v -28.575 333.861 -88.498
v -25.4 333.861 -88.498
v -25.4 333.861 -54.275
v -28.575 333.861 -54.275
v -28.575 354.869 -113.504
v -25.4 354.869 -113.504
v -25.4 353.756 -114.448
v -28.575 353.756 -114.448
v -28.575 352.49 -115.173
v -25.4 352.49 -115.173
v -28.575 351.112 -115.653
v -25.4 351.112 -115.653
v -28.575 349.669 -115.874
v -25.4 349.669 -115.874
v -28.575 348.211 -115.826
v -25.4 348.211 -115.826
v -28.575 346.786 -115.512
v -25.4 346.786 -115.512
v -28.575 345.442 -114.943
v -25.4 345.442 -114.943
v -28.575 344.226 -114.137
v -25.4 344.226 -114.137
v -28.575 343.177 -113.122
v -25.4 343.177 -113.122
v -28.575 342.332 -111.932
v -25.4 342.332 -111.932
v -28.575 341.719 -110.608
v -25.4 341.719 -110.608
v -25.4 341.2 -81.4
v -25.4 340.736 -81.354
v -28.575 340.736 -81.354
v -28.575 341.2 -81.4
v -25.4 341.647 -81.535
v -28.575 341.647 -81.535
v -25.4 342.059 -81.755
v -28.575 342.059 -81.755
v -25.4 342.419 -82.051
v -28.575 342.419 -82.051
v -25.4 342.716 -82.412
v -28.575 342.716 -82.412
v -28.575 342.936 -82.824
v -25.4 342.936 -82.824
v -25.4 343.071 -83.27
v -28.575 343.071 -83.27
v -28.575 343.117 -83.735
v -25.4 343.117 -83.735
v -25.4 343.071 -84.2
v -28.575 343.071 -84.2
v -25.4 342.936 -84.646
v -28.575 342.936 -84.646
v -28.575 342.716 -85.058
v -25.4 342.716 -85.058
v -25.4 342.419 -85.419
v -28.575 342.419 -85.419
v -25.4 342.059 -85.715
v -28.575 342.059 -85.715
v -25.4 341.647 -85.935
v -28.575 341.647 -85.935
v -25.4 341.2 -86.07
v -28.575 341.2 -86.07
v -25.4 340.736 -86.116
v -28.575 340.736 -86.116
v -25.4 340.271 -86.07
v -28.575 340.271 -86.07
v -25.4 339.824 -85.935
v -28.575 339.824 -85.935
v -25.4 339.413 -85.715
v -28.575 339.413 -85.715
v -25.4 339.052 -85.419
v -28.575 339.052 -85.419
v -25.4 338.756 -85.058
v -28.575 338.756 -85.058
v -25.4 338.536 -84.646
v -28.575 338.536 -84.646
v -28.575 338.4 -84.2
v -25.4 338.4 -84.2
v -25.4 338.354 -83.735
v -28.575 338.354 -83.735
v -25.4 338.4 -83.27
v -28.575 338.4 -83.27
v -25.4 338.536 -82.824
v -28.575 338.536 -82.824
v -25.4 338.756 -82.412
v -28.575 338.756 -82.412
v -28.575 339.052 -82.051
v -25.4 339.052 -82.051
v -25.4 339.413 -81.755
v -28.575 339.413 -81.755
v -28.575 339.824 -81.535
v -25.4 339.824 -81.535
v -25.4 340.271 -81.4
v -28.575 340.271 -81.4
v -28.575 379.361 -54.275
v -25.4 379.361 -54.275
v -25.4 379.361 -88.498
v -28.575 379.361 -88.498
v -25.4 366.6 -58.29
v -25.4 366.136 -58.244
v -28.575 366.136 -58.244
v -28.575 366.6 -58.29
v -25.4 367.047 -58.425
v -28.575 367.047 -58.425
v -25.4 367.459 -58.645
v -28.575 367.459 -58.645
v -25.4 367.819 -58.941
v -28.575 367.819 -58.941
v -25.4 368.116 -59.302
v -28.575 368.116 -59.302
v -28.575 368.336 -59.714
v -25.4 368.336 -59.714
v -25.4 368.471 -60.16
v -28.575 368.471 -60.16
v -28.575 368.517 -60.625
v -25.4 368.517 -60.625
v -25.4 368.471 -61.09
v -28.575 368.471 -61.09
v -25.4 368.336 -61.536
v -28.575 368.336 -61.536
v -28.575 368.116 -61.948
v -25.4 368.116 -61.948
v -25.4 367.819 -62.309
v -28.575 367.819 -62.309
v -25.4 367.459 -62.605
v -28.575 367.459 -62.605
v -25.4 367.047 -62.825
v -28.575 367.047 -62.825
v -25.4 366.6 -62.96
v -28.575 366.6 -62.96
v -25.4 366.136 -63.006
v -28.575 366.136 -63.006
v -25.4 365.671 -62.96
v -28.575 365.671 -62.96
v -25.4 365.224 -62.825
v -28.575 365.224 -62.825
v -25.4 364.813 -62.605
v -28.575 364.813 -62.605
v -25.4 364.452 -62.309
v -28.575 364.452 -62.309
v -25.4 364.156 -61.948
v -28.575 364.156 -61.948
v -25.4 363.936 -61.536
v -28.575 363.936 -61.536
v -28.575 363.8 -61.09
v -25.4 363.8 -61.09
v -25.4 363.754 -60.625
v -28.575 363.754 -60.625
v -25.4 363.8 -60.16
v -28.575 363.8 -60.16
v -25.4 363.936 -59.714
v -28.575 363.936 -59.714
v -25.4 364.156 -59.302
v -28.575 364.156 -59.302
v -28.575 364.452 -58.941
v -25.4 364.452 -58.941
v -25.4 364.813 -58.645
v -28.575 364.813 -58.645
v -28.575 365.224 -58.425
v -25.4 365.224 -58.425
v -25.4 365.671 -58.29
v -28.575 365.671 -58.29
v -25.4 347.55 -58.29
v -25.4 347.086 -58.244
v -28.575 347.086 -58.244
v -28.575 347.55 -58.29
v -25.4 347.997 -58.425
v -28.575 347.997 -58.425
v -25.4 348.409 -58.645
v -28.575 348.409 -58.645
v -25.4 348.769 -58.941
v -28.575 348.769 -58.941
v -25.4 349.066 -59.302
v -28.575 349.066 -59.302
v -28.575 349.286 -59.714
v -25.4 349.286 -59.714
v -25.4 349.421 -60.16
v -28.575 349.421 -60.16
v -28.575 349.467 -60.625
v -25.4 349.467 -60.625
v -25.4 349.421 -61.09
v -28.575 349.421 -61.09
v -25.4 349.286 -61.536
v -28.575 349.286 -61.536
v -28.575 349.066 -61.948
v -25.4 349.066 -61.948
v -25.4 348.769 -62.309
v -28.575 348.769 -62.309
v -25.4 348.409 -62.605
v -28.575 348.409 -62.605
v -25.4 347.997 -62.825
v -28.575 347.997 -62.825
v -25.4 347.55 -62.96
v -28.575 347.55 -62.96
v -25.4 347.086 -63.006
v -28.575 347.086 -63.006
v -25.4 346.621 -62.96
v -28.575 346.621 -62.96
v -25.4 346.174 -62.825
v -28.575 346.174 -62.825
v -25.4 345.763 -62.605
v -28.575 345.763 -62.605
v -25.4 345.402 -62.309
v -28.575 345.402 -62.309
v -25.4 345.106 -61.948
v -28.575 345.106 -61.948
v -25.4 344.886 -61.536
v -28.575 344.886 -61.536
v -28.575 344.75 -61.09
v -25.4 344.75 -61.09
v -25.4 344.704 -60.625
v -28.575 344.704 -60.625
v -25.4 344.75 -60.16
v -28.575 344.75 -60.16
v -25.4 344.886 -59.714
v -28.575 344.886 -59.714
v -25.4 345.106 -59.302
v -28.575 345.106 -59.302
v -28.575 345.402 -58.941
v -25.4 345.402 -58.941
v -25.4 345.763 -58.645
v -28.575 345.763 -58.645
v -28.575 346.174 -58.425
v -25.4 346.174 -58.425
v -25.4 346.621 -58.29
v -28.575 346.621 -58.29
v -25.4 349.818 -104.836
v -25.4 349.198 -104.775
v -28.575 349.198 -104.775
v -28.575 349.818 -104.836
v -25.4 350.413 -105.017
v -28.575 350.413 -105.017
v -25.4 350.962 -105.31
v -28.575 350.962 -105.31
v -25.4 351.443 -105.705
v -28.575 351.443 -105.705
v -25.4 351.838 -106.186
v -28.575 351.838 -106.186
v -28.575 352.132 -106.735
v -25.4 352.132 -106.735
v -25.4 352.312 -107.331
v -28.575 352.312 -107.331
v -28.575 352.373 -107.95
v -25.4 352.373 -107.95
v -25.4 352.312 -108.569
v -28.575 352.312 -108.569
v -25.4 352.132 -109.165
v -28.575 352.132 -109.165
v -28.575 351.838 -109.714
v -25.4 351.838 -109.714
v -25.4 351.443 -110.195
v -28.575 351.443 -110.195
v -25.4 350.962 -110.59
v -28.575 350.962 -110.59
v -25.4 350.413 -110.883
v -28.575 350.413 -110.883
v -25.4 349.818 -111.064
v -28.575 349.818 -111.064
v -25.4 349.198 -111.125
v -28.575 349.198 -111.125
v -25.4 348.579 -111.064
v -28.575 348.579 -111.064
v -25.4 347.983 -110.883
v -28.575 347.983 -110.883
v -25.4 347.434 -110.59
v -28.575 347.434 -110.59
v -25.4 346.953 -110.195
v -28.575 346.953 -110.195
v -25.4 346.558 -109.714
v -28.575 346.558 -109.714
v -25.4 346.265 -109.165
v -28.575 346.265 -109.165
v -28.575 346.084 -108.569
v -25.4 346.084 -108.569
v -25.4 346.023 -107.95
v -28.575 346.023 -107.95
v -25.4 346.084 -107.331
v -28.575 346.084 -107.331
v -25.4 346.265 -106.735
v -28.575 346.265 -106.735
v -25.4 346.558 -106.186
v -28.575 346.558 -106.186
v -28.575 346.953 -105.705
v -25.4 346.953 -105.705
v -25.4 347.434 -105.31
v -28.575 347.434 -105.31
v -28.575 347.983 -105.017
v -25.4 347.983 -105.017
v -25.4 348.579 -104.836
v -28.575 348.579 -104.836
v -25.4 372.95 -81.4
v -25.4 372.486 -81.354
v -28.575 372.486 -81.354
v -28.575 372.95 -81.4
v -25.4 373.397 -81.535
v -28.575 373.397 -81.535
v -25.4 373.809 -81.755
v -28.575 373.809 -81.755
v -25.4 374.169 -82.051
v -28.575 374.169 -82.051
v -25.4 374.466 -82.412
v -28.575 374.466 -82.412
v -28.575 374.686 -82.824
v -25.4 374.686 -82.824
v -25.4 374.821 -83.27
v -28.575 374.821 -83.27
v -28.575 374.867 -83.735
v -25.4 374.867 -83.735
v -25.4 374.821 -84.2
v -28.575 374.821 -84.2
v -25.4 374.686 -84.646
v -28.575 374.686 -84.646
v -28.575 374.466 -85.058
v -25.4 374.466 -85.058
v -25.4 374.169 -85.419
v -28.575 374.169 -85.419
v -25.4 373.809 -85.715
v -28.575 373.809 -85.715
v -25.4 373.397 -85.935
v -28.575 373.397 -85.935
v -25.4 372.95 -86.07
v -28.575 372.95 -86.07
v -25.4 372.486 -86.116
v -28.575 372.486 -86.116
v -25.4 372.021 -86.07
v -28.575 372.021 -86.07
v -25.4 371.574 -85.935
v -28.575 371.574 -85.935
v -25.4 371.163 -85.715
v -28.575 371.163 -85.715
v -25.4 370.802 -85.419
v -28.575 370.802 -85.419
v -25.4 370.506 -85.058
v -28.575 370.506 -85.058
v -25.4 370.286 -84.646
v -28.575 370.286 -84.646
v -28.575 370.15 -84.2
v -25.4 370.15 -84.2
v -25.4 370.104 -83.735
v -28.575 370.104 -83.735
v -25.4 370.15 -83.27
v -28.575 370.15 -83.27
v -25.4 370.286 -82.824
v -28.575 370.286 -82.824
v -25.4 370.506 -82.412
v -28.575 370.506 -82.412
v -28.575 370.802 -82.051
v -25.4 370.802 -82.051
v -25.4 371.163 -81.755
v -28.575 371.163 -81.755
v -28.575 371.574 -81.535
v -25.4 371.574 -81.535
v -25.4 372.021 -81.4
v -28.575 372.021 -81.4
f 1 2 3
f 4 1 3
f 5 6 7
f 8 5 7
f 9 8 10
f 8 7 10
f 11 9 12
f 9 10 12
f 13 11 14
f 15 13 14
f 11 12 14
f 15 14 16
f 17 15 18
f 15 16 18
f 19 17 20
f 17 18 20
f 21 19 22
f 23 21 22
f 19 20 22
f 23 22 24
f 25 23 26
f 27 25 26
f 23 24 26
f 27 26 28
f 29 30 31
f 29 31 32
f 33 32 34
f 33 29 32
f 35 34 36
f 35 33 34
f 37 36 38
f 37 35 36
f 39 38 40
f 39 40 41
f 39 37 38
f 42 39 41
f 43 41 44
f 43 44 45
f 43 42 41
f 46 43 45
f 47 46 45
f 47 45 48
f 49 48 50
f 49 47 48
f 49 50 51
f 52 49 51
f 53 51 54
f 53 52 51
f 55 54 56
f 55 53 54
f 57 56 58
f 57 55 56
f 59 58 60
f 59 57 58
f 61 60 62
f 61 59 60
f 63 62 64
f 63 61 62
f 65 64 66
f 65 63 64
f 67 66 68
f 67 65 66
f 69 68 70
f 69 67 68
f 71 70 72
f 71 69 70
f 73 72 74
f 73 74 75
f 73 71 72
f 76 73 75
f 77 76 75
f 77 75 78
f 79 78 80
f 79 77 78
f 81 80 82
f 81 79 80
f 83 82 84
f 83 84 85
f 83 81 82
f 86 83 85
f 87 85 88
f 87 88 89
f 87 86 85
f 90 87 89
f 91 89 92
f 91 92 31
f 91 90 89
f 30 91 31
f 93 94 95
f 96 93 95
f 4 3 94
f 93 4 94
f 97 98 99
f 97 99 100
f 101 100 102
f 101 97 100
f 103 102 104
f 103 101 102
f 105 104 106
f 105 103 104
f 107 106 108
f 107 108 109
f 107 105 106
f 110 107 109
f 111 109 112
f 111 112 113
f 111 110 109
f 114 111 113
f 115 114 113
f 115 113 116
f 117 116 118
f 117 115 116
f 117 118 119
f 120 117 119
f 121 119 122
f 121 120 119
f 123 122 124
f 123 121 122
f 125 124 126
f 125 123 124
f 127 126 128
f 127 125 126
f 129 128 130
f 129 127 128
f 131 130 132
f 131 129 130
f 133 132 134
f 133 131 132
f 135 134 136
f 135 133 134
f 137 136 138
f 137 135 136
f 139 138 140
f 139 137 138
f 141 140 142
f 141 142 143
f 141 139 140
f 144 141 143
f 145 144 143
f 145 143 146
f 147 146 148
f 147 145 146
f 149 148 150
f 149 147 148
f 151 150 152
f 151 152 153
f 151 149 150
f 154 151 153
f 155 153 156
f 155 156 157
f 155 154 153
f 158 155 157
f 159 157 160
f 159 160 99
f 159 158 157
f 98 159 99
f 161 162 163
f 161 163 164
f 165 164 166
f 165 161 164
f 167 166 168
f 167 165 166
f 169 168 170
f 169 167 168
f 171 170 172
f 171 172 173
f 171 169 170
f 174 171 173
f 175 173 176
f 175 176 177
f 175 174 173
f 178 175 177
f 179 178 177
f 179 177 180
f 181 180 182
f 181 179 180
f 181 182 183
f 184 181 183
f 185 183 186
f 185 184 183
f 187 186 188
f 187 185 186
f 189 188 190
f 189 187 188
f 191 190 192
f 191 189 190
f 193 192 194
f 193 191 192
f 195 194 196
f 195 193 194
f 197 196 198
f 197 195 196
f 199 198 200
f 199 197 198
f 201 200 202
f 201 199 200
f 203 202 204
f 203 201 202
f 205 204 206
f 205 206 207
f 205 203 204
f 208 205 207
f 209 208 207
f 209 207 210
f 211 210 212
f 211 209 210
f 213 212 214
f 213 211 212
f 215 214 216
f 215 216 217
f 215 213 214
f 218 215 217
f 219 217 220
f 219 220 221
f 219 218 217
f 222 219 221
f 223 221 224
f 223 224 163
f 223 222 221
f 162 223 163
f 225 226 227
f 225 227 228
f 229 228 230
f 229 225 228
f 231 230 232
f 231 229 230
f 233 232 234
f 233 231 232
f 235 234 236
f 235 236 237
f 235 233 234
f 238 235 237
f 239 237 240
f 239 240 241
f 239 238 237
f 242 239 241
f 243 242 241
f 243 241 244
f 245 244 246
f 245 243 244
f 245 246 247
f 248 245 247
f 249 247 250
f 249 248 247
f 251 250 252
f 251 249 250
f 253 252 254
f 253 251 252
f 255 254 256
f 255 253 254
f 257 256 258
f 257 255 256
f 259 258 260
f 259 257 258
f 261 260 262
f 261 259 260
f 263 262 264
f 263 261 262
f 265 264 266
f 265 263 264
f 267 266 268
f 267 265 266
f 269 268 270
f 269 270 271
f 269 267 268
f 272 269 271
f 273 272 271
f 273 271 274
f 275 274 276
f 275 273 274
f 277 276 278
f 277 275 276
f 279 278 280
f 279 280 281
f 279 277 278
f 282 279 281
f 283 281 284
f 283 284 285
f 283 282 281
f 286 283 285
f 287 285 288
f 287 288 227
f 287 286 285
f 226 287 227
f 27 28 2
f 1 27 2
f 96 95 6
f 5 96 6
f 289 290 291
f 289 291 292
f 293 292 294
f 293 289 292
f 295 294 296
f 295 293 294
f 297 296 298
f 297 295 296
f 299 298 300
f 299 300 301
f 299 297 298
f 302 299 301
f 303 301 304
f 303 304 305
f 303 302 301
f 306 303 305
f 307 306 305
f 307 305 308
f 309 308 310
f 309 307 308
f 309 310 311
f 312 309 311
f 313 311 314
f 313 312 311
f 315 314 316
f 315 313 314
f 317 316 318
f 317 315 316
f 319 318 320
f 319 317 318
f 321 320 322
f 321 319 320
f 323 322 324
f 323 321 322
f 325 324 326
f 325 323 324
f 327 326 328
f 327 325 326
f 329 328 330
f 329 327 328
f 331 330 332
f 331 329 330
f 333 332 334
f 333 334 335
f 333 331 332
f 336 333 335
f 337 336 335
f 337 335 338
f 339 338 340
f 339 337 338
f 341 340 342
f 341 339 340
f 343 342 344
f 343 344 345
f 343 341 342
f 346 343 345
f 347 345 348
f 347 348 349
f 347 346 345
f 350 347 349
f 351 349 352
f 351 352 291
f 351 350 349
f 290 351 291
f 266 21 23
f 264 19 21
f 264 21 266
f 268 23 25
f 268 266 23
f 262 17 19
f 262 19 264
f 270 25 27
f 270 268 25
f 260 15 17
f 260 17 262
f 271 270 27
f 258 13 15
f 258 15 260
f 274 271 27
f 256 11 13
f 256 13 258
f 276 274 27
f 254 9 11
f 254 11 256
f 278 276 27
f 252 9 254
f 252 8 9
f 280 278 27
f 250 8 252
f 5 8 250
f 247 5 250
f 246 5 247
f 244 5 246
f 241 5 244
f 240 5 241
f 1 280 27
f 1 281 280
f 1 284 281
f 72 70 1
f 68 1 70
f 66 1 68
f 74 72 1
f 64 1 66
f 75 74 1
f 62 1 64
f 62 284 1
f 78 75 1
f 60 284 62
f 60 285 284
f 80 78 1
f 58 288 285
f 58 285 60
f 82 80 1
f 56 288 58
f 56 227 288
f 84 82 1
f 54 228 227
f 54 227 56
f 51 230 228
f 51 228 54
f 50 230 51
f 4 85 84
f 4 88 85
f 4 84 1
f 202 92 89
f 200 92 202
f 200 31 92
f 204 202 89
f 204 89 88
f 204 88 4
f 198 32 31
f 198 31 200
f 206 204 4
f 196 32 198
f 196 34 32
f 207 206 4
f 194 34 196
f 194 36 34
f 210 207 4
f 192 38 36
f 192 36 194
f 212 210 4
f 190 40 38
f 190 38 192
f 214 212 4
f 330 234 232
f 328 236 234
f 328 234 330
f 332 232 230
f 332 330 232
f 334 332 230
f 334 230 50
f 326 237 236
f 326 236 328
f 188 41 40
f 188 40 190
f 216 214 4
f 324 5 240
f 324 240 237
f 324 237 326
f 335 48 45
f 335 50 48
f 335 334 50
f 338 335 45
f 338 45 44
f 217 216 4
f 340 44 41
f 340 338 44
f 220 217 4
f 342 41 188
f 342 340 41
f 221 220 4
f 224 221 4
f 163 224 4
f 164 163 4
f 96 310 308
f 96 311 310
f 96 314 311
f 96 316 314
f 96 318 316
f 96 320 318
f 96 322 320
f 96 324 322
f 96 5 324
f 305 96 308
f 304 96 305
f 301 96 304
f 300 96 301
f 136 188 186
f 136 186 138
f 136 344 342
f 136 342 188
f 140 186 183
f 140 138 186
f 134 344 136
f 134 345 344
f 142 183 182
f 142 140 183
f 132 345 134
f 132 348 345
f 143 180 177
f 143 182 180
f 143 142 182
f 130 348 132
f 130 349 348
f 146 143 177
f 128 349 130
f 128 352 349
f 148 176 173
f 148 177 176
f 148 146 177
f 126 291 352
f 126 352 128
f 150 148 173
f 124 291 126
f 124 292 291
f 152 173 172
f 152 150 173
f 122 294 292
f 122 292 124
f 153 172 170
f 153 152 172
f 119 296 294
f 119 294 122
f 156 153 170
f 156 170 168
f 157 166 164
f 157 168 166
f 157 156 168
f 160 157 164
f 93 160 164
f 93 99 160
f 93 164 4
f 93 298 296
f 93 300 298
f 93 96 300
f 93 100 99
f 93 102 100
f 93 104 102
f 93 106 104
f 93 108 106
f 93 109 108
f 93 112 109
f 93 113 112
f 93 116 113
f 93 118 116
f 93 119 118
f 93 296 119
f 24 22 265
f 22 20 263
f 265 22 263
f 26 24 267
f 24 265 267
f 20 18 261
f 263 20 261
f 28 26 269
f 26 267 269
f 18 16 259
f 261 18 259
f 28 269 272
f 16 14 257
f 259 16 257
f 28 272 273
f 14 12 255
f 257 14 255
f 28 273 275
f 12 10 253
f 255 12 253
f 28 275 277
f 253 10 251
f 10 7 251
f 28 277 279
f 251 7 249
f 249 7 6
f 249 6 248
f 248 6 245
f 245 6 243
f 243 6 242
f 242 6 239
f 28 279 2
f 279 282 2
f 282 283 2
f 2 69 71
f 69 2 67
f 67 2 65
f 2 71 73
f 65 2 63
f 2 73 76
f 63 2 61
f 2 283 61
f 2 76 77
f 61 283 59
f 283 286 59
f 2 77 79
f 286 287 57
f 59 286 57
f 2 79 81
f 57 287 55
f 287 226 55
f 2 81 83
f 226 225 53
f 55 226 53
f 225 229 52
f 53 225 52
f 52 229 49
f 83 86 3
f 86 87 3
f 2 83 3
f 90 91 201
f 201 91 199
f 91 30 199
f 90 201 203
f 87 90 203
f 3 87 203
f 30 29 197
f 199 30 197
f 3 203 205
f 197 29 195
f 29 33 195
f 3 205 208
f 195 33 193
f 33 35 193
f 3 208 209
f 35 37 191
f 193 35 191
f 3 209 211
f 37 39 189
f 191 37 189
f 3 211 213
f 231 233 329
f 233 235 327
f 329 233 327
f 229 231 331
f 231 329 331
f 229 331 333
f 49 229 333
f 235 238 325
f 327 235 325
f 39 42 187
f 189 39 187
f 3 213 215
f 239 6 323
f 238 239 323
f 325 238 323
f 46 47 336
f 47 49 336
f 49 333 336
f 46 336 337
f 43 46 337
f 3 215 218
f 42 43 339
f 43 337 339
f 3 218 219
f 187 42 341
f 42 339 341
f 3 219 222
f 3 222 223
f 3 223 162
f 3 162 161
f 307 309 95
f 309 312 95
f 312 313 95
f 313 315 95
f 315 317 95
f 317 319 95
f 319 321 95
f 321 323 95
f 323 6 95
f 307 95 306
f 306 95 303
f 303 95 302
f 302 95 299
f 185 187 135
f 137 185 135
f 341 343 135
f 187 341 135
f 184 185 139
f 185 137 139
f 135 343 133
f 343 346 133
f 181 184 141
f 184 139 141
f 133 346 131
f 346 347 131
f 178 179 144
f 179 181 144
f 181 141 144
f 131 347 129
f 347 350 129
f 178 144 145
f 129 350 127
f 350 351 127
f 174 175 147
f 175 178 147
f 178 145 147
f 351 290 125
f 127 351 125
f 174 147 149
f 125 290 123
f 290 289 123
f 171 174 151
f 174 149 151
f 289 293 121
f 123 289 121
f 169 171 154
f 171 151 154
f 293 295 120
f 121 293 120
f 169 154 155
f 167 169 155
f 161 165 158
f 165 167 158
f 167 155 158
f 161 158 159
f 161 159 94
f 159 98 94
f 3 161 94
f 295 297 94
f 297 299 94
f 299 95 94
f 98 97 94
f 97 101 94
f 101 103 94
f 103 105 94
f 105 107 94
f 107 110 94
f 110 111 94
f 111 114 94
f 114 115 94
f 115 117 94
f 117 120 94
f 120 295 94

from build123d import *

# Parameters (mm, degrees)
SKETCH1_R           = 3.175
SKETCH1_R_2         = 3.2639
SKETCH1_R_3         = 3.96875
SKETCH1_R_4         = 2.38125
BOSS_EXTRUDE1_DEPTH = 3.175


with BuildPart() as part:
    # Sketch1 → Boss-Extrude1 (new body)
    # profile 1 of 7: a face of its own
    with BuildSketch(Plane.ZY.offset(25.4)):
        with BuildLine():
            Line((-88.4975, 379.360683619), (-113.503995941, 354.868900976))
            ThreePointArc((-113.503995941, 354.868900976), (-115.701762144, 347.491113055), (-110.608164688, 341.71900808))
            Line((-110.608164688, 341.71900808), (-88.4975, 333.860683619))
            Line((-88.4975, 333.860683619), (-102.195874596, 351.845168269))
            ThreePointArc((-102.195874596, 351.845168269), (-103.980307482, 357.263971701), (-102.037425504, 362.628003857))
            Line((-102.037425504, 362.628003857), (-88.4975, 379.360683619))
        make_face()
        with Locations((-107.95, 349.198183619)):
            Circle(SKETCH1_R, mode=Mode.SUBTRACT)
    # profile 2 of 7: a face of its own
    with BuildSketch(Plane.ZY.offset(25.4)):
        with BuildLine():
            Line((-54.275, 333.860683619), (-54.275, 379.360683619))
            Line((-54.275, 379.360683619), (-88.4975, 379.360683619))
            Line((-88.4975, 379.360683619), (-102.037425504, 362.628003857))
            ThreePointArc((-102.037425504, 362.628003857), (-103.980307482, 357.263971701), (-102.195874596, 351.845168269))
            Line((-102.195874596, 351.845168269), (-88.4975, 333.860683619))
            Line((-88.4975, 333.860683619), (-54.275, 333.860683619))
        make_face()
        with Locations((-83.735, 340.735683619)):
            Circle(SKETCH1_R_2, mode=Mode.SUBTRACT)
        with Locations((-95.25, 357.135683619)):
            Circle(SKETCH1_R_3, mode=Mode.SUBTRACT)
        with Locations((-60.625, 366.135683619)):
            Circle(SKETCH1_R_2, mode=Mode.SUBTRACT)
        with Locations((-83.735, 372.485683619)):
            Circle(SKETCH1_R_2, mode=Mode.SUBTRACT)
        with Locations((-60.625, 347.085683619)):
            Circle(SKETCH1_R_2, mode=Mode.SUBTRACT)
    # profile 3 of 7: a face of its own
    with BuildSketch(Plane.ZY.offset(25.4)):
        with Locations((-95.25, 357.135683619)):
            Circle(SKETCH1_R_3)
    # profile 4 of 7: a face of its own
    with BuildSketch(Plane.ZY.offset(25.4)):
        with Locations((-60.625, 366.135683619)):
            Circle(SKETCH1_R_2)
        with Locations((-60.625, 366.135683619)):
            Circle(SKETCH1_R_4, mode=Mode.SUBTRACT)
    # profile 5 of 7: a face of its own
    with BuildSketch(Plane.ZY.offset(25.4)):
        with Locations((-83.735, 372.485683619)):
            Circle(SKETCH1_R_2)
        with Locations((-83.735, 372.485683619)):
            Circle(SKETCH1_R_4, mode=Mode.SUBTRACT)
    # profile 6 of 7: a face of its own
    with BuildSketch(Plane.ZY.offset(25.4)):
        with Locations((-60.625, 347.085683619)):
            Circle(SKETCH1_R_2)
        with Locations((-60.625, 347.085683619)):
            Circle(SKETCH1_R_4, mode=Mode.SUBTRACT)
    # profile 7 of 7: a face of its own
    with BuildSketch(Plane.ZY.offset(25.4)):
        with Locations((-83.735, 340.735683619)):
            Circle(SKETCH1_R_2)
        with Locations((-83.735, 340.735683619)):
            Circle(SKETCH1_R_4, mode=Mode.SUBTRACT)
    extrude(amount=BOSS_EXTRUDE1_DEPTH)


solid = part.part
